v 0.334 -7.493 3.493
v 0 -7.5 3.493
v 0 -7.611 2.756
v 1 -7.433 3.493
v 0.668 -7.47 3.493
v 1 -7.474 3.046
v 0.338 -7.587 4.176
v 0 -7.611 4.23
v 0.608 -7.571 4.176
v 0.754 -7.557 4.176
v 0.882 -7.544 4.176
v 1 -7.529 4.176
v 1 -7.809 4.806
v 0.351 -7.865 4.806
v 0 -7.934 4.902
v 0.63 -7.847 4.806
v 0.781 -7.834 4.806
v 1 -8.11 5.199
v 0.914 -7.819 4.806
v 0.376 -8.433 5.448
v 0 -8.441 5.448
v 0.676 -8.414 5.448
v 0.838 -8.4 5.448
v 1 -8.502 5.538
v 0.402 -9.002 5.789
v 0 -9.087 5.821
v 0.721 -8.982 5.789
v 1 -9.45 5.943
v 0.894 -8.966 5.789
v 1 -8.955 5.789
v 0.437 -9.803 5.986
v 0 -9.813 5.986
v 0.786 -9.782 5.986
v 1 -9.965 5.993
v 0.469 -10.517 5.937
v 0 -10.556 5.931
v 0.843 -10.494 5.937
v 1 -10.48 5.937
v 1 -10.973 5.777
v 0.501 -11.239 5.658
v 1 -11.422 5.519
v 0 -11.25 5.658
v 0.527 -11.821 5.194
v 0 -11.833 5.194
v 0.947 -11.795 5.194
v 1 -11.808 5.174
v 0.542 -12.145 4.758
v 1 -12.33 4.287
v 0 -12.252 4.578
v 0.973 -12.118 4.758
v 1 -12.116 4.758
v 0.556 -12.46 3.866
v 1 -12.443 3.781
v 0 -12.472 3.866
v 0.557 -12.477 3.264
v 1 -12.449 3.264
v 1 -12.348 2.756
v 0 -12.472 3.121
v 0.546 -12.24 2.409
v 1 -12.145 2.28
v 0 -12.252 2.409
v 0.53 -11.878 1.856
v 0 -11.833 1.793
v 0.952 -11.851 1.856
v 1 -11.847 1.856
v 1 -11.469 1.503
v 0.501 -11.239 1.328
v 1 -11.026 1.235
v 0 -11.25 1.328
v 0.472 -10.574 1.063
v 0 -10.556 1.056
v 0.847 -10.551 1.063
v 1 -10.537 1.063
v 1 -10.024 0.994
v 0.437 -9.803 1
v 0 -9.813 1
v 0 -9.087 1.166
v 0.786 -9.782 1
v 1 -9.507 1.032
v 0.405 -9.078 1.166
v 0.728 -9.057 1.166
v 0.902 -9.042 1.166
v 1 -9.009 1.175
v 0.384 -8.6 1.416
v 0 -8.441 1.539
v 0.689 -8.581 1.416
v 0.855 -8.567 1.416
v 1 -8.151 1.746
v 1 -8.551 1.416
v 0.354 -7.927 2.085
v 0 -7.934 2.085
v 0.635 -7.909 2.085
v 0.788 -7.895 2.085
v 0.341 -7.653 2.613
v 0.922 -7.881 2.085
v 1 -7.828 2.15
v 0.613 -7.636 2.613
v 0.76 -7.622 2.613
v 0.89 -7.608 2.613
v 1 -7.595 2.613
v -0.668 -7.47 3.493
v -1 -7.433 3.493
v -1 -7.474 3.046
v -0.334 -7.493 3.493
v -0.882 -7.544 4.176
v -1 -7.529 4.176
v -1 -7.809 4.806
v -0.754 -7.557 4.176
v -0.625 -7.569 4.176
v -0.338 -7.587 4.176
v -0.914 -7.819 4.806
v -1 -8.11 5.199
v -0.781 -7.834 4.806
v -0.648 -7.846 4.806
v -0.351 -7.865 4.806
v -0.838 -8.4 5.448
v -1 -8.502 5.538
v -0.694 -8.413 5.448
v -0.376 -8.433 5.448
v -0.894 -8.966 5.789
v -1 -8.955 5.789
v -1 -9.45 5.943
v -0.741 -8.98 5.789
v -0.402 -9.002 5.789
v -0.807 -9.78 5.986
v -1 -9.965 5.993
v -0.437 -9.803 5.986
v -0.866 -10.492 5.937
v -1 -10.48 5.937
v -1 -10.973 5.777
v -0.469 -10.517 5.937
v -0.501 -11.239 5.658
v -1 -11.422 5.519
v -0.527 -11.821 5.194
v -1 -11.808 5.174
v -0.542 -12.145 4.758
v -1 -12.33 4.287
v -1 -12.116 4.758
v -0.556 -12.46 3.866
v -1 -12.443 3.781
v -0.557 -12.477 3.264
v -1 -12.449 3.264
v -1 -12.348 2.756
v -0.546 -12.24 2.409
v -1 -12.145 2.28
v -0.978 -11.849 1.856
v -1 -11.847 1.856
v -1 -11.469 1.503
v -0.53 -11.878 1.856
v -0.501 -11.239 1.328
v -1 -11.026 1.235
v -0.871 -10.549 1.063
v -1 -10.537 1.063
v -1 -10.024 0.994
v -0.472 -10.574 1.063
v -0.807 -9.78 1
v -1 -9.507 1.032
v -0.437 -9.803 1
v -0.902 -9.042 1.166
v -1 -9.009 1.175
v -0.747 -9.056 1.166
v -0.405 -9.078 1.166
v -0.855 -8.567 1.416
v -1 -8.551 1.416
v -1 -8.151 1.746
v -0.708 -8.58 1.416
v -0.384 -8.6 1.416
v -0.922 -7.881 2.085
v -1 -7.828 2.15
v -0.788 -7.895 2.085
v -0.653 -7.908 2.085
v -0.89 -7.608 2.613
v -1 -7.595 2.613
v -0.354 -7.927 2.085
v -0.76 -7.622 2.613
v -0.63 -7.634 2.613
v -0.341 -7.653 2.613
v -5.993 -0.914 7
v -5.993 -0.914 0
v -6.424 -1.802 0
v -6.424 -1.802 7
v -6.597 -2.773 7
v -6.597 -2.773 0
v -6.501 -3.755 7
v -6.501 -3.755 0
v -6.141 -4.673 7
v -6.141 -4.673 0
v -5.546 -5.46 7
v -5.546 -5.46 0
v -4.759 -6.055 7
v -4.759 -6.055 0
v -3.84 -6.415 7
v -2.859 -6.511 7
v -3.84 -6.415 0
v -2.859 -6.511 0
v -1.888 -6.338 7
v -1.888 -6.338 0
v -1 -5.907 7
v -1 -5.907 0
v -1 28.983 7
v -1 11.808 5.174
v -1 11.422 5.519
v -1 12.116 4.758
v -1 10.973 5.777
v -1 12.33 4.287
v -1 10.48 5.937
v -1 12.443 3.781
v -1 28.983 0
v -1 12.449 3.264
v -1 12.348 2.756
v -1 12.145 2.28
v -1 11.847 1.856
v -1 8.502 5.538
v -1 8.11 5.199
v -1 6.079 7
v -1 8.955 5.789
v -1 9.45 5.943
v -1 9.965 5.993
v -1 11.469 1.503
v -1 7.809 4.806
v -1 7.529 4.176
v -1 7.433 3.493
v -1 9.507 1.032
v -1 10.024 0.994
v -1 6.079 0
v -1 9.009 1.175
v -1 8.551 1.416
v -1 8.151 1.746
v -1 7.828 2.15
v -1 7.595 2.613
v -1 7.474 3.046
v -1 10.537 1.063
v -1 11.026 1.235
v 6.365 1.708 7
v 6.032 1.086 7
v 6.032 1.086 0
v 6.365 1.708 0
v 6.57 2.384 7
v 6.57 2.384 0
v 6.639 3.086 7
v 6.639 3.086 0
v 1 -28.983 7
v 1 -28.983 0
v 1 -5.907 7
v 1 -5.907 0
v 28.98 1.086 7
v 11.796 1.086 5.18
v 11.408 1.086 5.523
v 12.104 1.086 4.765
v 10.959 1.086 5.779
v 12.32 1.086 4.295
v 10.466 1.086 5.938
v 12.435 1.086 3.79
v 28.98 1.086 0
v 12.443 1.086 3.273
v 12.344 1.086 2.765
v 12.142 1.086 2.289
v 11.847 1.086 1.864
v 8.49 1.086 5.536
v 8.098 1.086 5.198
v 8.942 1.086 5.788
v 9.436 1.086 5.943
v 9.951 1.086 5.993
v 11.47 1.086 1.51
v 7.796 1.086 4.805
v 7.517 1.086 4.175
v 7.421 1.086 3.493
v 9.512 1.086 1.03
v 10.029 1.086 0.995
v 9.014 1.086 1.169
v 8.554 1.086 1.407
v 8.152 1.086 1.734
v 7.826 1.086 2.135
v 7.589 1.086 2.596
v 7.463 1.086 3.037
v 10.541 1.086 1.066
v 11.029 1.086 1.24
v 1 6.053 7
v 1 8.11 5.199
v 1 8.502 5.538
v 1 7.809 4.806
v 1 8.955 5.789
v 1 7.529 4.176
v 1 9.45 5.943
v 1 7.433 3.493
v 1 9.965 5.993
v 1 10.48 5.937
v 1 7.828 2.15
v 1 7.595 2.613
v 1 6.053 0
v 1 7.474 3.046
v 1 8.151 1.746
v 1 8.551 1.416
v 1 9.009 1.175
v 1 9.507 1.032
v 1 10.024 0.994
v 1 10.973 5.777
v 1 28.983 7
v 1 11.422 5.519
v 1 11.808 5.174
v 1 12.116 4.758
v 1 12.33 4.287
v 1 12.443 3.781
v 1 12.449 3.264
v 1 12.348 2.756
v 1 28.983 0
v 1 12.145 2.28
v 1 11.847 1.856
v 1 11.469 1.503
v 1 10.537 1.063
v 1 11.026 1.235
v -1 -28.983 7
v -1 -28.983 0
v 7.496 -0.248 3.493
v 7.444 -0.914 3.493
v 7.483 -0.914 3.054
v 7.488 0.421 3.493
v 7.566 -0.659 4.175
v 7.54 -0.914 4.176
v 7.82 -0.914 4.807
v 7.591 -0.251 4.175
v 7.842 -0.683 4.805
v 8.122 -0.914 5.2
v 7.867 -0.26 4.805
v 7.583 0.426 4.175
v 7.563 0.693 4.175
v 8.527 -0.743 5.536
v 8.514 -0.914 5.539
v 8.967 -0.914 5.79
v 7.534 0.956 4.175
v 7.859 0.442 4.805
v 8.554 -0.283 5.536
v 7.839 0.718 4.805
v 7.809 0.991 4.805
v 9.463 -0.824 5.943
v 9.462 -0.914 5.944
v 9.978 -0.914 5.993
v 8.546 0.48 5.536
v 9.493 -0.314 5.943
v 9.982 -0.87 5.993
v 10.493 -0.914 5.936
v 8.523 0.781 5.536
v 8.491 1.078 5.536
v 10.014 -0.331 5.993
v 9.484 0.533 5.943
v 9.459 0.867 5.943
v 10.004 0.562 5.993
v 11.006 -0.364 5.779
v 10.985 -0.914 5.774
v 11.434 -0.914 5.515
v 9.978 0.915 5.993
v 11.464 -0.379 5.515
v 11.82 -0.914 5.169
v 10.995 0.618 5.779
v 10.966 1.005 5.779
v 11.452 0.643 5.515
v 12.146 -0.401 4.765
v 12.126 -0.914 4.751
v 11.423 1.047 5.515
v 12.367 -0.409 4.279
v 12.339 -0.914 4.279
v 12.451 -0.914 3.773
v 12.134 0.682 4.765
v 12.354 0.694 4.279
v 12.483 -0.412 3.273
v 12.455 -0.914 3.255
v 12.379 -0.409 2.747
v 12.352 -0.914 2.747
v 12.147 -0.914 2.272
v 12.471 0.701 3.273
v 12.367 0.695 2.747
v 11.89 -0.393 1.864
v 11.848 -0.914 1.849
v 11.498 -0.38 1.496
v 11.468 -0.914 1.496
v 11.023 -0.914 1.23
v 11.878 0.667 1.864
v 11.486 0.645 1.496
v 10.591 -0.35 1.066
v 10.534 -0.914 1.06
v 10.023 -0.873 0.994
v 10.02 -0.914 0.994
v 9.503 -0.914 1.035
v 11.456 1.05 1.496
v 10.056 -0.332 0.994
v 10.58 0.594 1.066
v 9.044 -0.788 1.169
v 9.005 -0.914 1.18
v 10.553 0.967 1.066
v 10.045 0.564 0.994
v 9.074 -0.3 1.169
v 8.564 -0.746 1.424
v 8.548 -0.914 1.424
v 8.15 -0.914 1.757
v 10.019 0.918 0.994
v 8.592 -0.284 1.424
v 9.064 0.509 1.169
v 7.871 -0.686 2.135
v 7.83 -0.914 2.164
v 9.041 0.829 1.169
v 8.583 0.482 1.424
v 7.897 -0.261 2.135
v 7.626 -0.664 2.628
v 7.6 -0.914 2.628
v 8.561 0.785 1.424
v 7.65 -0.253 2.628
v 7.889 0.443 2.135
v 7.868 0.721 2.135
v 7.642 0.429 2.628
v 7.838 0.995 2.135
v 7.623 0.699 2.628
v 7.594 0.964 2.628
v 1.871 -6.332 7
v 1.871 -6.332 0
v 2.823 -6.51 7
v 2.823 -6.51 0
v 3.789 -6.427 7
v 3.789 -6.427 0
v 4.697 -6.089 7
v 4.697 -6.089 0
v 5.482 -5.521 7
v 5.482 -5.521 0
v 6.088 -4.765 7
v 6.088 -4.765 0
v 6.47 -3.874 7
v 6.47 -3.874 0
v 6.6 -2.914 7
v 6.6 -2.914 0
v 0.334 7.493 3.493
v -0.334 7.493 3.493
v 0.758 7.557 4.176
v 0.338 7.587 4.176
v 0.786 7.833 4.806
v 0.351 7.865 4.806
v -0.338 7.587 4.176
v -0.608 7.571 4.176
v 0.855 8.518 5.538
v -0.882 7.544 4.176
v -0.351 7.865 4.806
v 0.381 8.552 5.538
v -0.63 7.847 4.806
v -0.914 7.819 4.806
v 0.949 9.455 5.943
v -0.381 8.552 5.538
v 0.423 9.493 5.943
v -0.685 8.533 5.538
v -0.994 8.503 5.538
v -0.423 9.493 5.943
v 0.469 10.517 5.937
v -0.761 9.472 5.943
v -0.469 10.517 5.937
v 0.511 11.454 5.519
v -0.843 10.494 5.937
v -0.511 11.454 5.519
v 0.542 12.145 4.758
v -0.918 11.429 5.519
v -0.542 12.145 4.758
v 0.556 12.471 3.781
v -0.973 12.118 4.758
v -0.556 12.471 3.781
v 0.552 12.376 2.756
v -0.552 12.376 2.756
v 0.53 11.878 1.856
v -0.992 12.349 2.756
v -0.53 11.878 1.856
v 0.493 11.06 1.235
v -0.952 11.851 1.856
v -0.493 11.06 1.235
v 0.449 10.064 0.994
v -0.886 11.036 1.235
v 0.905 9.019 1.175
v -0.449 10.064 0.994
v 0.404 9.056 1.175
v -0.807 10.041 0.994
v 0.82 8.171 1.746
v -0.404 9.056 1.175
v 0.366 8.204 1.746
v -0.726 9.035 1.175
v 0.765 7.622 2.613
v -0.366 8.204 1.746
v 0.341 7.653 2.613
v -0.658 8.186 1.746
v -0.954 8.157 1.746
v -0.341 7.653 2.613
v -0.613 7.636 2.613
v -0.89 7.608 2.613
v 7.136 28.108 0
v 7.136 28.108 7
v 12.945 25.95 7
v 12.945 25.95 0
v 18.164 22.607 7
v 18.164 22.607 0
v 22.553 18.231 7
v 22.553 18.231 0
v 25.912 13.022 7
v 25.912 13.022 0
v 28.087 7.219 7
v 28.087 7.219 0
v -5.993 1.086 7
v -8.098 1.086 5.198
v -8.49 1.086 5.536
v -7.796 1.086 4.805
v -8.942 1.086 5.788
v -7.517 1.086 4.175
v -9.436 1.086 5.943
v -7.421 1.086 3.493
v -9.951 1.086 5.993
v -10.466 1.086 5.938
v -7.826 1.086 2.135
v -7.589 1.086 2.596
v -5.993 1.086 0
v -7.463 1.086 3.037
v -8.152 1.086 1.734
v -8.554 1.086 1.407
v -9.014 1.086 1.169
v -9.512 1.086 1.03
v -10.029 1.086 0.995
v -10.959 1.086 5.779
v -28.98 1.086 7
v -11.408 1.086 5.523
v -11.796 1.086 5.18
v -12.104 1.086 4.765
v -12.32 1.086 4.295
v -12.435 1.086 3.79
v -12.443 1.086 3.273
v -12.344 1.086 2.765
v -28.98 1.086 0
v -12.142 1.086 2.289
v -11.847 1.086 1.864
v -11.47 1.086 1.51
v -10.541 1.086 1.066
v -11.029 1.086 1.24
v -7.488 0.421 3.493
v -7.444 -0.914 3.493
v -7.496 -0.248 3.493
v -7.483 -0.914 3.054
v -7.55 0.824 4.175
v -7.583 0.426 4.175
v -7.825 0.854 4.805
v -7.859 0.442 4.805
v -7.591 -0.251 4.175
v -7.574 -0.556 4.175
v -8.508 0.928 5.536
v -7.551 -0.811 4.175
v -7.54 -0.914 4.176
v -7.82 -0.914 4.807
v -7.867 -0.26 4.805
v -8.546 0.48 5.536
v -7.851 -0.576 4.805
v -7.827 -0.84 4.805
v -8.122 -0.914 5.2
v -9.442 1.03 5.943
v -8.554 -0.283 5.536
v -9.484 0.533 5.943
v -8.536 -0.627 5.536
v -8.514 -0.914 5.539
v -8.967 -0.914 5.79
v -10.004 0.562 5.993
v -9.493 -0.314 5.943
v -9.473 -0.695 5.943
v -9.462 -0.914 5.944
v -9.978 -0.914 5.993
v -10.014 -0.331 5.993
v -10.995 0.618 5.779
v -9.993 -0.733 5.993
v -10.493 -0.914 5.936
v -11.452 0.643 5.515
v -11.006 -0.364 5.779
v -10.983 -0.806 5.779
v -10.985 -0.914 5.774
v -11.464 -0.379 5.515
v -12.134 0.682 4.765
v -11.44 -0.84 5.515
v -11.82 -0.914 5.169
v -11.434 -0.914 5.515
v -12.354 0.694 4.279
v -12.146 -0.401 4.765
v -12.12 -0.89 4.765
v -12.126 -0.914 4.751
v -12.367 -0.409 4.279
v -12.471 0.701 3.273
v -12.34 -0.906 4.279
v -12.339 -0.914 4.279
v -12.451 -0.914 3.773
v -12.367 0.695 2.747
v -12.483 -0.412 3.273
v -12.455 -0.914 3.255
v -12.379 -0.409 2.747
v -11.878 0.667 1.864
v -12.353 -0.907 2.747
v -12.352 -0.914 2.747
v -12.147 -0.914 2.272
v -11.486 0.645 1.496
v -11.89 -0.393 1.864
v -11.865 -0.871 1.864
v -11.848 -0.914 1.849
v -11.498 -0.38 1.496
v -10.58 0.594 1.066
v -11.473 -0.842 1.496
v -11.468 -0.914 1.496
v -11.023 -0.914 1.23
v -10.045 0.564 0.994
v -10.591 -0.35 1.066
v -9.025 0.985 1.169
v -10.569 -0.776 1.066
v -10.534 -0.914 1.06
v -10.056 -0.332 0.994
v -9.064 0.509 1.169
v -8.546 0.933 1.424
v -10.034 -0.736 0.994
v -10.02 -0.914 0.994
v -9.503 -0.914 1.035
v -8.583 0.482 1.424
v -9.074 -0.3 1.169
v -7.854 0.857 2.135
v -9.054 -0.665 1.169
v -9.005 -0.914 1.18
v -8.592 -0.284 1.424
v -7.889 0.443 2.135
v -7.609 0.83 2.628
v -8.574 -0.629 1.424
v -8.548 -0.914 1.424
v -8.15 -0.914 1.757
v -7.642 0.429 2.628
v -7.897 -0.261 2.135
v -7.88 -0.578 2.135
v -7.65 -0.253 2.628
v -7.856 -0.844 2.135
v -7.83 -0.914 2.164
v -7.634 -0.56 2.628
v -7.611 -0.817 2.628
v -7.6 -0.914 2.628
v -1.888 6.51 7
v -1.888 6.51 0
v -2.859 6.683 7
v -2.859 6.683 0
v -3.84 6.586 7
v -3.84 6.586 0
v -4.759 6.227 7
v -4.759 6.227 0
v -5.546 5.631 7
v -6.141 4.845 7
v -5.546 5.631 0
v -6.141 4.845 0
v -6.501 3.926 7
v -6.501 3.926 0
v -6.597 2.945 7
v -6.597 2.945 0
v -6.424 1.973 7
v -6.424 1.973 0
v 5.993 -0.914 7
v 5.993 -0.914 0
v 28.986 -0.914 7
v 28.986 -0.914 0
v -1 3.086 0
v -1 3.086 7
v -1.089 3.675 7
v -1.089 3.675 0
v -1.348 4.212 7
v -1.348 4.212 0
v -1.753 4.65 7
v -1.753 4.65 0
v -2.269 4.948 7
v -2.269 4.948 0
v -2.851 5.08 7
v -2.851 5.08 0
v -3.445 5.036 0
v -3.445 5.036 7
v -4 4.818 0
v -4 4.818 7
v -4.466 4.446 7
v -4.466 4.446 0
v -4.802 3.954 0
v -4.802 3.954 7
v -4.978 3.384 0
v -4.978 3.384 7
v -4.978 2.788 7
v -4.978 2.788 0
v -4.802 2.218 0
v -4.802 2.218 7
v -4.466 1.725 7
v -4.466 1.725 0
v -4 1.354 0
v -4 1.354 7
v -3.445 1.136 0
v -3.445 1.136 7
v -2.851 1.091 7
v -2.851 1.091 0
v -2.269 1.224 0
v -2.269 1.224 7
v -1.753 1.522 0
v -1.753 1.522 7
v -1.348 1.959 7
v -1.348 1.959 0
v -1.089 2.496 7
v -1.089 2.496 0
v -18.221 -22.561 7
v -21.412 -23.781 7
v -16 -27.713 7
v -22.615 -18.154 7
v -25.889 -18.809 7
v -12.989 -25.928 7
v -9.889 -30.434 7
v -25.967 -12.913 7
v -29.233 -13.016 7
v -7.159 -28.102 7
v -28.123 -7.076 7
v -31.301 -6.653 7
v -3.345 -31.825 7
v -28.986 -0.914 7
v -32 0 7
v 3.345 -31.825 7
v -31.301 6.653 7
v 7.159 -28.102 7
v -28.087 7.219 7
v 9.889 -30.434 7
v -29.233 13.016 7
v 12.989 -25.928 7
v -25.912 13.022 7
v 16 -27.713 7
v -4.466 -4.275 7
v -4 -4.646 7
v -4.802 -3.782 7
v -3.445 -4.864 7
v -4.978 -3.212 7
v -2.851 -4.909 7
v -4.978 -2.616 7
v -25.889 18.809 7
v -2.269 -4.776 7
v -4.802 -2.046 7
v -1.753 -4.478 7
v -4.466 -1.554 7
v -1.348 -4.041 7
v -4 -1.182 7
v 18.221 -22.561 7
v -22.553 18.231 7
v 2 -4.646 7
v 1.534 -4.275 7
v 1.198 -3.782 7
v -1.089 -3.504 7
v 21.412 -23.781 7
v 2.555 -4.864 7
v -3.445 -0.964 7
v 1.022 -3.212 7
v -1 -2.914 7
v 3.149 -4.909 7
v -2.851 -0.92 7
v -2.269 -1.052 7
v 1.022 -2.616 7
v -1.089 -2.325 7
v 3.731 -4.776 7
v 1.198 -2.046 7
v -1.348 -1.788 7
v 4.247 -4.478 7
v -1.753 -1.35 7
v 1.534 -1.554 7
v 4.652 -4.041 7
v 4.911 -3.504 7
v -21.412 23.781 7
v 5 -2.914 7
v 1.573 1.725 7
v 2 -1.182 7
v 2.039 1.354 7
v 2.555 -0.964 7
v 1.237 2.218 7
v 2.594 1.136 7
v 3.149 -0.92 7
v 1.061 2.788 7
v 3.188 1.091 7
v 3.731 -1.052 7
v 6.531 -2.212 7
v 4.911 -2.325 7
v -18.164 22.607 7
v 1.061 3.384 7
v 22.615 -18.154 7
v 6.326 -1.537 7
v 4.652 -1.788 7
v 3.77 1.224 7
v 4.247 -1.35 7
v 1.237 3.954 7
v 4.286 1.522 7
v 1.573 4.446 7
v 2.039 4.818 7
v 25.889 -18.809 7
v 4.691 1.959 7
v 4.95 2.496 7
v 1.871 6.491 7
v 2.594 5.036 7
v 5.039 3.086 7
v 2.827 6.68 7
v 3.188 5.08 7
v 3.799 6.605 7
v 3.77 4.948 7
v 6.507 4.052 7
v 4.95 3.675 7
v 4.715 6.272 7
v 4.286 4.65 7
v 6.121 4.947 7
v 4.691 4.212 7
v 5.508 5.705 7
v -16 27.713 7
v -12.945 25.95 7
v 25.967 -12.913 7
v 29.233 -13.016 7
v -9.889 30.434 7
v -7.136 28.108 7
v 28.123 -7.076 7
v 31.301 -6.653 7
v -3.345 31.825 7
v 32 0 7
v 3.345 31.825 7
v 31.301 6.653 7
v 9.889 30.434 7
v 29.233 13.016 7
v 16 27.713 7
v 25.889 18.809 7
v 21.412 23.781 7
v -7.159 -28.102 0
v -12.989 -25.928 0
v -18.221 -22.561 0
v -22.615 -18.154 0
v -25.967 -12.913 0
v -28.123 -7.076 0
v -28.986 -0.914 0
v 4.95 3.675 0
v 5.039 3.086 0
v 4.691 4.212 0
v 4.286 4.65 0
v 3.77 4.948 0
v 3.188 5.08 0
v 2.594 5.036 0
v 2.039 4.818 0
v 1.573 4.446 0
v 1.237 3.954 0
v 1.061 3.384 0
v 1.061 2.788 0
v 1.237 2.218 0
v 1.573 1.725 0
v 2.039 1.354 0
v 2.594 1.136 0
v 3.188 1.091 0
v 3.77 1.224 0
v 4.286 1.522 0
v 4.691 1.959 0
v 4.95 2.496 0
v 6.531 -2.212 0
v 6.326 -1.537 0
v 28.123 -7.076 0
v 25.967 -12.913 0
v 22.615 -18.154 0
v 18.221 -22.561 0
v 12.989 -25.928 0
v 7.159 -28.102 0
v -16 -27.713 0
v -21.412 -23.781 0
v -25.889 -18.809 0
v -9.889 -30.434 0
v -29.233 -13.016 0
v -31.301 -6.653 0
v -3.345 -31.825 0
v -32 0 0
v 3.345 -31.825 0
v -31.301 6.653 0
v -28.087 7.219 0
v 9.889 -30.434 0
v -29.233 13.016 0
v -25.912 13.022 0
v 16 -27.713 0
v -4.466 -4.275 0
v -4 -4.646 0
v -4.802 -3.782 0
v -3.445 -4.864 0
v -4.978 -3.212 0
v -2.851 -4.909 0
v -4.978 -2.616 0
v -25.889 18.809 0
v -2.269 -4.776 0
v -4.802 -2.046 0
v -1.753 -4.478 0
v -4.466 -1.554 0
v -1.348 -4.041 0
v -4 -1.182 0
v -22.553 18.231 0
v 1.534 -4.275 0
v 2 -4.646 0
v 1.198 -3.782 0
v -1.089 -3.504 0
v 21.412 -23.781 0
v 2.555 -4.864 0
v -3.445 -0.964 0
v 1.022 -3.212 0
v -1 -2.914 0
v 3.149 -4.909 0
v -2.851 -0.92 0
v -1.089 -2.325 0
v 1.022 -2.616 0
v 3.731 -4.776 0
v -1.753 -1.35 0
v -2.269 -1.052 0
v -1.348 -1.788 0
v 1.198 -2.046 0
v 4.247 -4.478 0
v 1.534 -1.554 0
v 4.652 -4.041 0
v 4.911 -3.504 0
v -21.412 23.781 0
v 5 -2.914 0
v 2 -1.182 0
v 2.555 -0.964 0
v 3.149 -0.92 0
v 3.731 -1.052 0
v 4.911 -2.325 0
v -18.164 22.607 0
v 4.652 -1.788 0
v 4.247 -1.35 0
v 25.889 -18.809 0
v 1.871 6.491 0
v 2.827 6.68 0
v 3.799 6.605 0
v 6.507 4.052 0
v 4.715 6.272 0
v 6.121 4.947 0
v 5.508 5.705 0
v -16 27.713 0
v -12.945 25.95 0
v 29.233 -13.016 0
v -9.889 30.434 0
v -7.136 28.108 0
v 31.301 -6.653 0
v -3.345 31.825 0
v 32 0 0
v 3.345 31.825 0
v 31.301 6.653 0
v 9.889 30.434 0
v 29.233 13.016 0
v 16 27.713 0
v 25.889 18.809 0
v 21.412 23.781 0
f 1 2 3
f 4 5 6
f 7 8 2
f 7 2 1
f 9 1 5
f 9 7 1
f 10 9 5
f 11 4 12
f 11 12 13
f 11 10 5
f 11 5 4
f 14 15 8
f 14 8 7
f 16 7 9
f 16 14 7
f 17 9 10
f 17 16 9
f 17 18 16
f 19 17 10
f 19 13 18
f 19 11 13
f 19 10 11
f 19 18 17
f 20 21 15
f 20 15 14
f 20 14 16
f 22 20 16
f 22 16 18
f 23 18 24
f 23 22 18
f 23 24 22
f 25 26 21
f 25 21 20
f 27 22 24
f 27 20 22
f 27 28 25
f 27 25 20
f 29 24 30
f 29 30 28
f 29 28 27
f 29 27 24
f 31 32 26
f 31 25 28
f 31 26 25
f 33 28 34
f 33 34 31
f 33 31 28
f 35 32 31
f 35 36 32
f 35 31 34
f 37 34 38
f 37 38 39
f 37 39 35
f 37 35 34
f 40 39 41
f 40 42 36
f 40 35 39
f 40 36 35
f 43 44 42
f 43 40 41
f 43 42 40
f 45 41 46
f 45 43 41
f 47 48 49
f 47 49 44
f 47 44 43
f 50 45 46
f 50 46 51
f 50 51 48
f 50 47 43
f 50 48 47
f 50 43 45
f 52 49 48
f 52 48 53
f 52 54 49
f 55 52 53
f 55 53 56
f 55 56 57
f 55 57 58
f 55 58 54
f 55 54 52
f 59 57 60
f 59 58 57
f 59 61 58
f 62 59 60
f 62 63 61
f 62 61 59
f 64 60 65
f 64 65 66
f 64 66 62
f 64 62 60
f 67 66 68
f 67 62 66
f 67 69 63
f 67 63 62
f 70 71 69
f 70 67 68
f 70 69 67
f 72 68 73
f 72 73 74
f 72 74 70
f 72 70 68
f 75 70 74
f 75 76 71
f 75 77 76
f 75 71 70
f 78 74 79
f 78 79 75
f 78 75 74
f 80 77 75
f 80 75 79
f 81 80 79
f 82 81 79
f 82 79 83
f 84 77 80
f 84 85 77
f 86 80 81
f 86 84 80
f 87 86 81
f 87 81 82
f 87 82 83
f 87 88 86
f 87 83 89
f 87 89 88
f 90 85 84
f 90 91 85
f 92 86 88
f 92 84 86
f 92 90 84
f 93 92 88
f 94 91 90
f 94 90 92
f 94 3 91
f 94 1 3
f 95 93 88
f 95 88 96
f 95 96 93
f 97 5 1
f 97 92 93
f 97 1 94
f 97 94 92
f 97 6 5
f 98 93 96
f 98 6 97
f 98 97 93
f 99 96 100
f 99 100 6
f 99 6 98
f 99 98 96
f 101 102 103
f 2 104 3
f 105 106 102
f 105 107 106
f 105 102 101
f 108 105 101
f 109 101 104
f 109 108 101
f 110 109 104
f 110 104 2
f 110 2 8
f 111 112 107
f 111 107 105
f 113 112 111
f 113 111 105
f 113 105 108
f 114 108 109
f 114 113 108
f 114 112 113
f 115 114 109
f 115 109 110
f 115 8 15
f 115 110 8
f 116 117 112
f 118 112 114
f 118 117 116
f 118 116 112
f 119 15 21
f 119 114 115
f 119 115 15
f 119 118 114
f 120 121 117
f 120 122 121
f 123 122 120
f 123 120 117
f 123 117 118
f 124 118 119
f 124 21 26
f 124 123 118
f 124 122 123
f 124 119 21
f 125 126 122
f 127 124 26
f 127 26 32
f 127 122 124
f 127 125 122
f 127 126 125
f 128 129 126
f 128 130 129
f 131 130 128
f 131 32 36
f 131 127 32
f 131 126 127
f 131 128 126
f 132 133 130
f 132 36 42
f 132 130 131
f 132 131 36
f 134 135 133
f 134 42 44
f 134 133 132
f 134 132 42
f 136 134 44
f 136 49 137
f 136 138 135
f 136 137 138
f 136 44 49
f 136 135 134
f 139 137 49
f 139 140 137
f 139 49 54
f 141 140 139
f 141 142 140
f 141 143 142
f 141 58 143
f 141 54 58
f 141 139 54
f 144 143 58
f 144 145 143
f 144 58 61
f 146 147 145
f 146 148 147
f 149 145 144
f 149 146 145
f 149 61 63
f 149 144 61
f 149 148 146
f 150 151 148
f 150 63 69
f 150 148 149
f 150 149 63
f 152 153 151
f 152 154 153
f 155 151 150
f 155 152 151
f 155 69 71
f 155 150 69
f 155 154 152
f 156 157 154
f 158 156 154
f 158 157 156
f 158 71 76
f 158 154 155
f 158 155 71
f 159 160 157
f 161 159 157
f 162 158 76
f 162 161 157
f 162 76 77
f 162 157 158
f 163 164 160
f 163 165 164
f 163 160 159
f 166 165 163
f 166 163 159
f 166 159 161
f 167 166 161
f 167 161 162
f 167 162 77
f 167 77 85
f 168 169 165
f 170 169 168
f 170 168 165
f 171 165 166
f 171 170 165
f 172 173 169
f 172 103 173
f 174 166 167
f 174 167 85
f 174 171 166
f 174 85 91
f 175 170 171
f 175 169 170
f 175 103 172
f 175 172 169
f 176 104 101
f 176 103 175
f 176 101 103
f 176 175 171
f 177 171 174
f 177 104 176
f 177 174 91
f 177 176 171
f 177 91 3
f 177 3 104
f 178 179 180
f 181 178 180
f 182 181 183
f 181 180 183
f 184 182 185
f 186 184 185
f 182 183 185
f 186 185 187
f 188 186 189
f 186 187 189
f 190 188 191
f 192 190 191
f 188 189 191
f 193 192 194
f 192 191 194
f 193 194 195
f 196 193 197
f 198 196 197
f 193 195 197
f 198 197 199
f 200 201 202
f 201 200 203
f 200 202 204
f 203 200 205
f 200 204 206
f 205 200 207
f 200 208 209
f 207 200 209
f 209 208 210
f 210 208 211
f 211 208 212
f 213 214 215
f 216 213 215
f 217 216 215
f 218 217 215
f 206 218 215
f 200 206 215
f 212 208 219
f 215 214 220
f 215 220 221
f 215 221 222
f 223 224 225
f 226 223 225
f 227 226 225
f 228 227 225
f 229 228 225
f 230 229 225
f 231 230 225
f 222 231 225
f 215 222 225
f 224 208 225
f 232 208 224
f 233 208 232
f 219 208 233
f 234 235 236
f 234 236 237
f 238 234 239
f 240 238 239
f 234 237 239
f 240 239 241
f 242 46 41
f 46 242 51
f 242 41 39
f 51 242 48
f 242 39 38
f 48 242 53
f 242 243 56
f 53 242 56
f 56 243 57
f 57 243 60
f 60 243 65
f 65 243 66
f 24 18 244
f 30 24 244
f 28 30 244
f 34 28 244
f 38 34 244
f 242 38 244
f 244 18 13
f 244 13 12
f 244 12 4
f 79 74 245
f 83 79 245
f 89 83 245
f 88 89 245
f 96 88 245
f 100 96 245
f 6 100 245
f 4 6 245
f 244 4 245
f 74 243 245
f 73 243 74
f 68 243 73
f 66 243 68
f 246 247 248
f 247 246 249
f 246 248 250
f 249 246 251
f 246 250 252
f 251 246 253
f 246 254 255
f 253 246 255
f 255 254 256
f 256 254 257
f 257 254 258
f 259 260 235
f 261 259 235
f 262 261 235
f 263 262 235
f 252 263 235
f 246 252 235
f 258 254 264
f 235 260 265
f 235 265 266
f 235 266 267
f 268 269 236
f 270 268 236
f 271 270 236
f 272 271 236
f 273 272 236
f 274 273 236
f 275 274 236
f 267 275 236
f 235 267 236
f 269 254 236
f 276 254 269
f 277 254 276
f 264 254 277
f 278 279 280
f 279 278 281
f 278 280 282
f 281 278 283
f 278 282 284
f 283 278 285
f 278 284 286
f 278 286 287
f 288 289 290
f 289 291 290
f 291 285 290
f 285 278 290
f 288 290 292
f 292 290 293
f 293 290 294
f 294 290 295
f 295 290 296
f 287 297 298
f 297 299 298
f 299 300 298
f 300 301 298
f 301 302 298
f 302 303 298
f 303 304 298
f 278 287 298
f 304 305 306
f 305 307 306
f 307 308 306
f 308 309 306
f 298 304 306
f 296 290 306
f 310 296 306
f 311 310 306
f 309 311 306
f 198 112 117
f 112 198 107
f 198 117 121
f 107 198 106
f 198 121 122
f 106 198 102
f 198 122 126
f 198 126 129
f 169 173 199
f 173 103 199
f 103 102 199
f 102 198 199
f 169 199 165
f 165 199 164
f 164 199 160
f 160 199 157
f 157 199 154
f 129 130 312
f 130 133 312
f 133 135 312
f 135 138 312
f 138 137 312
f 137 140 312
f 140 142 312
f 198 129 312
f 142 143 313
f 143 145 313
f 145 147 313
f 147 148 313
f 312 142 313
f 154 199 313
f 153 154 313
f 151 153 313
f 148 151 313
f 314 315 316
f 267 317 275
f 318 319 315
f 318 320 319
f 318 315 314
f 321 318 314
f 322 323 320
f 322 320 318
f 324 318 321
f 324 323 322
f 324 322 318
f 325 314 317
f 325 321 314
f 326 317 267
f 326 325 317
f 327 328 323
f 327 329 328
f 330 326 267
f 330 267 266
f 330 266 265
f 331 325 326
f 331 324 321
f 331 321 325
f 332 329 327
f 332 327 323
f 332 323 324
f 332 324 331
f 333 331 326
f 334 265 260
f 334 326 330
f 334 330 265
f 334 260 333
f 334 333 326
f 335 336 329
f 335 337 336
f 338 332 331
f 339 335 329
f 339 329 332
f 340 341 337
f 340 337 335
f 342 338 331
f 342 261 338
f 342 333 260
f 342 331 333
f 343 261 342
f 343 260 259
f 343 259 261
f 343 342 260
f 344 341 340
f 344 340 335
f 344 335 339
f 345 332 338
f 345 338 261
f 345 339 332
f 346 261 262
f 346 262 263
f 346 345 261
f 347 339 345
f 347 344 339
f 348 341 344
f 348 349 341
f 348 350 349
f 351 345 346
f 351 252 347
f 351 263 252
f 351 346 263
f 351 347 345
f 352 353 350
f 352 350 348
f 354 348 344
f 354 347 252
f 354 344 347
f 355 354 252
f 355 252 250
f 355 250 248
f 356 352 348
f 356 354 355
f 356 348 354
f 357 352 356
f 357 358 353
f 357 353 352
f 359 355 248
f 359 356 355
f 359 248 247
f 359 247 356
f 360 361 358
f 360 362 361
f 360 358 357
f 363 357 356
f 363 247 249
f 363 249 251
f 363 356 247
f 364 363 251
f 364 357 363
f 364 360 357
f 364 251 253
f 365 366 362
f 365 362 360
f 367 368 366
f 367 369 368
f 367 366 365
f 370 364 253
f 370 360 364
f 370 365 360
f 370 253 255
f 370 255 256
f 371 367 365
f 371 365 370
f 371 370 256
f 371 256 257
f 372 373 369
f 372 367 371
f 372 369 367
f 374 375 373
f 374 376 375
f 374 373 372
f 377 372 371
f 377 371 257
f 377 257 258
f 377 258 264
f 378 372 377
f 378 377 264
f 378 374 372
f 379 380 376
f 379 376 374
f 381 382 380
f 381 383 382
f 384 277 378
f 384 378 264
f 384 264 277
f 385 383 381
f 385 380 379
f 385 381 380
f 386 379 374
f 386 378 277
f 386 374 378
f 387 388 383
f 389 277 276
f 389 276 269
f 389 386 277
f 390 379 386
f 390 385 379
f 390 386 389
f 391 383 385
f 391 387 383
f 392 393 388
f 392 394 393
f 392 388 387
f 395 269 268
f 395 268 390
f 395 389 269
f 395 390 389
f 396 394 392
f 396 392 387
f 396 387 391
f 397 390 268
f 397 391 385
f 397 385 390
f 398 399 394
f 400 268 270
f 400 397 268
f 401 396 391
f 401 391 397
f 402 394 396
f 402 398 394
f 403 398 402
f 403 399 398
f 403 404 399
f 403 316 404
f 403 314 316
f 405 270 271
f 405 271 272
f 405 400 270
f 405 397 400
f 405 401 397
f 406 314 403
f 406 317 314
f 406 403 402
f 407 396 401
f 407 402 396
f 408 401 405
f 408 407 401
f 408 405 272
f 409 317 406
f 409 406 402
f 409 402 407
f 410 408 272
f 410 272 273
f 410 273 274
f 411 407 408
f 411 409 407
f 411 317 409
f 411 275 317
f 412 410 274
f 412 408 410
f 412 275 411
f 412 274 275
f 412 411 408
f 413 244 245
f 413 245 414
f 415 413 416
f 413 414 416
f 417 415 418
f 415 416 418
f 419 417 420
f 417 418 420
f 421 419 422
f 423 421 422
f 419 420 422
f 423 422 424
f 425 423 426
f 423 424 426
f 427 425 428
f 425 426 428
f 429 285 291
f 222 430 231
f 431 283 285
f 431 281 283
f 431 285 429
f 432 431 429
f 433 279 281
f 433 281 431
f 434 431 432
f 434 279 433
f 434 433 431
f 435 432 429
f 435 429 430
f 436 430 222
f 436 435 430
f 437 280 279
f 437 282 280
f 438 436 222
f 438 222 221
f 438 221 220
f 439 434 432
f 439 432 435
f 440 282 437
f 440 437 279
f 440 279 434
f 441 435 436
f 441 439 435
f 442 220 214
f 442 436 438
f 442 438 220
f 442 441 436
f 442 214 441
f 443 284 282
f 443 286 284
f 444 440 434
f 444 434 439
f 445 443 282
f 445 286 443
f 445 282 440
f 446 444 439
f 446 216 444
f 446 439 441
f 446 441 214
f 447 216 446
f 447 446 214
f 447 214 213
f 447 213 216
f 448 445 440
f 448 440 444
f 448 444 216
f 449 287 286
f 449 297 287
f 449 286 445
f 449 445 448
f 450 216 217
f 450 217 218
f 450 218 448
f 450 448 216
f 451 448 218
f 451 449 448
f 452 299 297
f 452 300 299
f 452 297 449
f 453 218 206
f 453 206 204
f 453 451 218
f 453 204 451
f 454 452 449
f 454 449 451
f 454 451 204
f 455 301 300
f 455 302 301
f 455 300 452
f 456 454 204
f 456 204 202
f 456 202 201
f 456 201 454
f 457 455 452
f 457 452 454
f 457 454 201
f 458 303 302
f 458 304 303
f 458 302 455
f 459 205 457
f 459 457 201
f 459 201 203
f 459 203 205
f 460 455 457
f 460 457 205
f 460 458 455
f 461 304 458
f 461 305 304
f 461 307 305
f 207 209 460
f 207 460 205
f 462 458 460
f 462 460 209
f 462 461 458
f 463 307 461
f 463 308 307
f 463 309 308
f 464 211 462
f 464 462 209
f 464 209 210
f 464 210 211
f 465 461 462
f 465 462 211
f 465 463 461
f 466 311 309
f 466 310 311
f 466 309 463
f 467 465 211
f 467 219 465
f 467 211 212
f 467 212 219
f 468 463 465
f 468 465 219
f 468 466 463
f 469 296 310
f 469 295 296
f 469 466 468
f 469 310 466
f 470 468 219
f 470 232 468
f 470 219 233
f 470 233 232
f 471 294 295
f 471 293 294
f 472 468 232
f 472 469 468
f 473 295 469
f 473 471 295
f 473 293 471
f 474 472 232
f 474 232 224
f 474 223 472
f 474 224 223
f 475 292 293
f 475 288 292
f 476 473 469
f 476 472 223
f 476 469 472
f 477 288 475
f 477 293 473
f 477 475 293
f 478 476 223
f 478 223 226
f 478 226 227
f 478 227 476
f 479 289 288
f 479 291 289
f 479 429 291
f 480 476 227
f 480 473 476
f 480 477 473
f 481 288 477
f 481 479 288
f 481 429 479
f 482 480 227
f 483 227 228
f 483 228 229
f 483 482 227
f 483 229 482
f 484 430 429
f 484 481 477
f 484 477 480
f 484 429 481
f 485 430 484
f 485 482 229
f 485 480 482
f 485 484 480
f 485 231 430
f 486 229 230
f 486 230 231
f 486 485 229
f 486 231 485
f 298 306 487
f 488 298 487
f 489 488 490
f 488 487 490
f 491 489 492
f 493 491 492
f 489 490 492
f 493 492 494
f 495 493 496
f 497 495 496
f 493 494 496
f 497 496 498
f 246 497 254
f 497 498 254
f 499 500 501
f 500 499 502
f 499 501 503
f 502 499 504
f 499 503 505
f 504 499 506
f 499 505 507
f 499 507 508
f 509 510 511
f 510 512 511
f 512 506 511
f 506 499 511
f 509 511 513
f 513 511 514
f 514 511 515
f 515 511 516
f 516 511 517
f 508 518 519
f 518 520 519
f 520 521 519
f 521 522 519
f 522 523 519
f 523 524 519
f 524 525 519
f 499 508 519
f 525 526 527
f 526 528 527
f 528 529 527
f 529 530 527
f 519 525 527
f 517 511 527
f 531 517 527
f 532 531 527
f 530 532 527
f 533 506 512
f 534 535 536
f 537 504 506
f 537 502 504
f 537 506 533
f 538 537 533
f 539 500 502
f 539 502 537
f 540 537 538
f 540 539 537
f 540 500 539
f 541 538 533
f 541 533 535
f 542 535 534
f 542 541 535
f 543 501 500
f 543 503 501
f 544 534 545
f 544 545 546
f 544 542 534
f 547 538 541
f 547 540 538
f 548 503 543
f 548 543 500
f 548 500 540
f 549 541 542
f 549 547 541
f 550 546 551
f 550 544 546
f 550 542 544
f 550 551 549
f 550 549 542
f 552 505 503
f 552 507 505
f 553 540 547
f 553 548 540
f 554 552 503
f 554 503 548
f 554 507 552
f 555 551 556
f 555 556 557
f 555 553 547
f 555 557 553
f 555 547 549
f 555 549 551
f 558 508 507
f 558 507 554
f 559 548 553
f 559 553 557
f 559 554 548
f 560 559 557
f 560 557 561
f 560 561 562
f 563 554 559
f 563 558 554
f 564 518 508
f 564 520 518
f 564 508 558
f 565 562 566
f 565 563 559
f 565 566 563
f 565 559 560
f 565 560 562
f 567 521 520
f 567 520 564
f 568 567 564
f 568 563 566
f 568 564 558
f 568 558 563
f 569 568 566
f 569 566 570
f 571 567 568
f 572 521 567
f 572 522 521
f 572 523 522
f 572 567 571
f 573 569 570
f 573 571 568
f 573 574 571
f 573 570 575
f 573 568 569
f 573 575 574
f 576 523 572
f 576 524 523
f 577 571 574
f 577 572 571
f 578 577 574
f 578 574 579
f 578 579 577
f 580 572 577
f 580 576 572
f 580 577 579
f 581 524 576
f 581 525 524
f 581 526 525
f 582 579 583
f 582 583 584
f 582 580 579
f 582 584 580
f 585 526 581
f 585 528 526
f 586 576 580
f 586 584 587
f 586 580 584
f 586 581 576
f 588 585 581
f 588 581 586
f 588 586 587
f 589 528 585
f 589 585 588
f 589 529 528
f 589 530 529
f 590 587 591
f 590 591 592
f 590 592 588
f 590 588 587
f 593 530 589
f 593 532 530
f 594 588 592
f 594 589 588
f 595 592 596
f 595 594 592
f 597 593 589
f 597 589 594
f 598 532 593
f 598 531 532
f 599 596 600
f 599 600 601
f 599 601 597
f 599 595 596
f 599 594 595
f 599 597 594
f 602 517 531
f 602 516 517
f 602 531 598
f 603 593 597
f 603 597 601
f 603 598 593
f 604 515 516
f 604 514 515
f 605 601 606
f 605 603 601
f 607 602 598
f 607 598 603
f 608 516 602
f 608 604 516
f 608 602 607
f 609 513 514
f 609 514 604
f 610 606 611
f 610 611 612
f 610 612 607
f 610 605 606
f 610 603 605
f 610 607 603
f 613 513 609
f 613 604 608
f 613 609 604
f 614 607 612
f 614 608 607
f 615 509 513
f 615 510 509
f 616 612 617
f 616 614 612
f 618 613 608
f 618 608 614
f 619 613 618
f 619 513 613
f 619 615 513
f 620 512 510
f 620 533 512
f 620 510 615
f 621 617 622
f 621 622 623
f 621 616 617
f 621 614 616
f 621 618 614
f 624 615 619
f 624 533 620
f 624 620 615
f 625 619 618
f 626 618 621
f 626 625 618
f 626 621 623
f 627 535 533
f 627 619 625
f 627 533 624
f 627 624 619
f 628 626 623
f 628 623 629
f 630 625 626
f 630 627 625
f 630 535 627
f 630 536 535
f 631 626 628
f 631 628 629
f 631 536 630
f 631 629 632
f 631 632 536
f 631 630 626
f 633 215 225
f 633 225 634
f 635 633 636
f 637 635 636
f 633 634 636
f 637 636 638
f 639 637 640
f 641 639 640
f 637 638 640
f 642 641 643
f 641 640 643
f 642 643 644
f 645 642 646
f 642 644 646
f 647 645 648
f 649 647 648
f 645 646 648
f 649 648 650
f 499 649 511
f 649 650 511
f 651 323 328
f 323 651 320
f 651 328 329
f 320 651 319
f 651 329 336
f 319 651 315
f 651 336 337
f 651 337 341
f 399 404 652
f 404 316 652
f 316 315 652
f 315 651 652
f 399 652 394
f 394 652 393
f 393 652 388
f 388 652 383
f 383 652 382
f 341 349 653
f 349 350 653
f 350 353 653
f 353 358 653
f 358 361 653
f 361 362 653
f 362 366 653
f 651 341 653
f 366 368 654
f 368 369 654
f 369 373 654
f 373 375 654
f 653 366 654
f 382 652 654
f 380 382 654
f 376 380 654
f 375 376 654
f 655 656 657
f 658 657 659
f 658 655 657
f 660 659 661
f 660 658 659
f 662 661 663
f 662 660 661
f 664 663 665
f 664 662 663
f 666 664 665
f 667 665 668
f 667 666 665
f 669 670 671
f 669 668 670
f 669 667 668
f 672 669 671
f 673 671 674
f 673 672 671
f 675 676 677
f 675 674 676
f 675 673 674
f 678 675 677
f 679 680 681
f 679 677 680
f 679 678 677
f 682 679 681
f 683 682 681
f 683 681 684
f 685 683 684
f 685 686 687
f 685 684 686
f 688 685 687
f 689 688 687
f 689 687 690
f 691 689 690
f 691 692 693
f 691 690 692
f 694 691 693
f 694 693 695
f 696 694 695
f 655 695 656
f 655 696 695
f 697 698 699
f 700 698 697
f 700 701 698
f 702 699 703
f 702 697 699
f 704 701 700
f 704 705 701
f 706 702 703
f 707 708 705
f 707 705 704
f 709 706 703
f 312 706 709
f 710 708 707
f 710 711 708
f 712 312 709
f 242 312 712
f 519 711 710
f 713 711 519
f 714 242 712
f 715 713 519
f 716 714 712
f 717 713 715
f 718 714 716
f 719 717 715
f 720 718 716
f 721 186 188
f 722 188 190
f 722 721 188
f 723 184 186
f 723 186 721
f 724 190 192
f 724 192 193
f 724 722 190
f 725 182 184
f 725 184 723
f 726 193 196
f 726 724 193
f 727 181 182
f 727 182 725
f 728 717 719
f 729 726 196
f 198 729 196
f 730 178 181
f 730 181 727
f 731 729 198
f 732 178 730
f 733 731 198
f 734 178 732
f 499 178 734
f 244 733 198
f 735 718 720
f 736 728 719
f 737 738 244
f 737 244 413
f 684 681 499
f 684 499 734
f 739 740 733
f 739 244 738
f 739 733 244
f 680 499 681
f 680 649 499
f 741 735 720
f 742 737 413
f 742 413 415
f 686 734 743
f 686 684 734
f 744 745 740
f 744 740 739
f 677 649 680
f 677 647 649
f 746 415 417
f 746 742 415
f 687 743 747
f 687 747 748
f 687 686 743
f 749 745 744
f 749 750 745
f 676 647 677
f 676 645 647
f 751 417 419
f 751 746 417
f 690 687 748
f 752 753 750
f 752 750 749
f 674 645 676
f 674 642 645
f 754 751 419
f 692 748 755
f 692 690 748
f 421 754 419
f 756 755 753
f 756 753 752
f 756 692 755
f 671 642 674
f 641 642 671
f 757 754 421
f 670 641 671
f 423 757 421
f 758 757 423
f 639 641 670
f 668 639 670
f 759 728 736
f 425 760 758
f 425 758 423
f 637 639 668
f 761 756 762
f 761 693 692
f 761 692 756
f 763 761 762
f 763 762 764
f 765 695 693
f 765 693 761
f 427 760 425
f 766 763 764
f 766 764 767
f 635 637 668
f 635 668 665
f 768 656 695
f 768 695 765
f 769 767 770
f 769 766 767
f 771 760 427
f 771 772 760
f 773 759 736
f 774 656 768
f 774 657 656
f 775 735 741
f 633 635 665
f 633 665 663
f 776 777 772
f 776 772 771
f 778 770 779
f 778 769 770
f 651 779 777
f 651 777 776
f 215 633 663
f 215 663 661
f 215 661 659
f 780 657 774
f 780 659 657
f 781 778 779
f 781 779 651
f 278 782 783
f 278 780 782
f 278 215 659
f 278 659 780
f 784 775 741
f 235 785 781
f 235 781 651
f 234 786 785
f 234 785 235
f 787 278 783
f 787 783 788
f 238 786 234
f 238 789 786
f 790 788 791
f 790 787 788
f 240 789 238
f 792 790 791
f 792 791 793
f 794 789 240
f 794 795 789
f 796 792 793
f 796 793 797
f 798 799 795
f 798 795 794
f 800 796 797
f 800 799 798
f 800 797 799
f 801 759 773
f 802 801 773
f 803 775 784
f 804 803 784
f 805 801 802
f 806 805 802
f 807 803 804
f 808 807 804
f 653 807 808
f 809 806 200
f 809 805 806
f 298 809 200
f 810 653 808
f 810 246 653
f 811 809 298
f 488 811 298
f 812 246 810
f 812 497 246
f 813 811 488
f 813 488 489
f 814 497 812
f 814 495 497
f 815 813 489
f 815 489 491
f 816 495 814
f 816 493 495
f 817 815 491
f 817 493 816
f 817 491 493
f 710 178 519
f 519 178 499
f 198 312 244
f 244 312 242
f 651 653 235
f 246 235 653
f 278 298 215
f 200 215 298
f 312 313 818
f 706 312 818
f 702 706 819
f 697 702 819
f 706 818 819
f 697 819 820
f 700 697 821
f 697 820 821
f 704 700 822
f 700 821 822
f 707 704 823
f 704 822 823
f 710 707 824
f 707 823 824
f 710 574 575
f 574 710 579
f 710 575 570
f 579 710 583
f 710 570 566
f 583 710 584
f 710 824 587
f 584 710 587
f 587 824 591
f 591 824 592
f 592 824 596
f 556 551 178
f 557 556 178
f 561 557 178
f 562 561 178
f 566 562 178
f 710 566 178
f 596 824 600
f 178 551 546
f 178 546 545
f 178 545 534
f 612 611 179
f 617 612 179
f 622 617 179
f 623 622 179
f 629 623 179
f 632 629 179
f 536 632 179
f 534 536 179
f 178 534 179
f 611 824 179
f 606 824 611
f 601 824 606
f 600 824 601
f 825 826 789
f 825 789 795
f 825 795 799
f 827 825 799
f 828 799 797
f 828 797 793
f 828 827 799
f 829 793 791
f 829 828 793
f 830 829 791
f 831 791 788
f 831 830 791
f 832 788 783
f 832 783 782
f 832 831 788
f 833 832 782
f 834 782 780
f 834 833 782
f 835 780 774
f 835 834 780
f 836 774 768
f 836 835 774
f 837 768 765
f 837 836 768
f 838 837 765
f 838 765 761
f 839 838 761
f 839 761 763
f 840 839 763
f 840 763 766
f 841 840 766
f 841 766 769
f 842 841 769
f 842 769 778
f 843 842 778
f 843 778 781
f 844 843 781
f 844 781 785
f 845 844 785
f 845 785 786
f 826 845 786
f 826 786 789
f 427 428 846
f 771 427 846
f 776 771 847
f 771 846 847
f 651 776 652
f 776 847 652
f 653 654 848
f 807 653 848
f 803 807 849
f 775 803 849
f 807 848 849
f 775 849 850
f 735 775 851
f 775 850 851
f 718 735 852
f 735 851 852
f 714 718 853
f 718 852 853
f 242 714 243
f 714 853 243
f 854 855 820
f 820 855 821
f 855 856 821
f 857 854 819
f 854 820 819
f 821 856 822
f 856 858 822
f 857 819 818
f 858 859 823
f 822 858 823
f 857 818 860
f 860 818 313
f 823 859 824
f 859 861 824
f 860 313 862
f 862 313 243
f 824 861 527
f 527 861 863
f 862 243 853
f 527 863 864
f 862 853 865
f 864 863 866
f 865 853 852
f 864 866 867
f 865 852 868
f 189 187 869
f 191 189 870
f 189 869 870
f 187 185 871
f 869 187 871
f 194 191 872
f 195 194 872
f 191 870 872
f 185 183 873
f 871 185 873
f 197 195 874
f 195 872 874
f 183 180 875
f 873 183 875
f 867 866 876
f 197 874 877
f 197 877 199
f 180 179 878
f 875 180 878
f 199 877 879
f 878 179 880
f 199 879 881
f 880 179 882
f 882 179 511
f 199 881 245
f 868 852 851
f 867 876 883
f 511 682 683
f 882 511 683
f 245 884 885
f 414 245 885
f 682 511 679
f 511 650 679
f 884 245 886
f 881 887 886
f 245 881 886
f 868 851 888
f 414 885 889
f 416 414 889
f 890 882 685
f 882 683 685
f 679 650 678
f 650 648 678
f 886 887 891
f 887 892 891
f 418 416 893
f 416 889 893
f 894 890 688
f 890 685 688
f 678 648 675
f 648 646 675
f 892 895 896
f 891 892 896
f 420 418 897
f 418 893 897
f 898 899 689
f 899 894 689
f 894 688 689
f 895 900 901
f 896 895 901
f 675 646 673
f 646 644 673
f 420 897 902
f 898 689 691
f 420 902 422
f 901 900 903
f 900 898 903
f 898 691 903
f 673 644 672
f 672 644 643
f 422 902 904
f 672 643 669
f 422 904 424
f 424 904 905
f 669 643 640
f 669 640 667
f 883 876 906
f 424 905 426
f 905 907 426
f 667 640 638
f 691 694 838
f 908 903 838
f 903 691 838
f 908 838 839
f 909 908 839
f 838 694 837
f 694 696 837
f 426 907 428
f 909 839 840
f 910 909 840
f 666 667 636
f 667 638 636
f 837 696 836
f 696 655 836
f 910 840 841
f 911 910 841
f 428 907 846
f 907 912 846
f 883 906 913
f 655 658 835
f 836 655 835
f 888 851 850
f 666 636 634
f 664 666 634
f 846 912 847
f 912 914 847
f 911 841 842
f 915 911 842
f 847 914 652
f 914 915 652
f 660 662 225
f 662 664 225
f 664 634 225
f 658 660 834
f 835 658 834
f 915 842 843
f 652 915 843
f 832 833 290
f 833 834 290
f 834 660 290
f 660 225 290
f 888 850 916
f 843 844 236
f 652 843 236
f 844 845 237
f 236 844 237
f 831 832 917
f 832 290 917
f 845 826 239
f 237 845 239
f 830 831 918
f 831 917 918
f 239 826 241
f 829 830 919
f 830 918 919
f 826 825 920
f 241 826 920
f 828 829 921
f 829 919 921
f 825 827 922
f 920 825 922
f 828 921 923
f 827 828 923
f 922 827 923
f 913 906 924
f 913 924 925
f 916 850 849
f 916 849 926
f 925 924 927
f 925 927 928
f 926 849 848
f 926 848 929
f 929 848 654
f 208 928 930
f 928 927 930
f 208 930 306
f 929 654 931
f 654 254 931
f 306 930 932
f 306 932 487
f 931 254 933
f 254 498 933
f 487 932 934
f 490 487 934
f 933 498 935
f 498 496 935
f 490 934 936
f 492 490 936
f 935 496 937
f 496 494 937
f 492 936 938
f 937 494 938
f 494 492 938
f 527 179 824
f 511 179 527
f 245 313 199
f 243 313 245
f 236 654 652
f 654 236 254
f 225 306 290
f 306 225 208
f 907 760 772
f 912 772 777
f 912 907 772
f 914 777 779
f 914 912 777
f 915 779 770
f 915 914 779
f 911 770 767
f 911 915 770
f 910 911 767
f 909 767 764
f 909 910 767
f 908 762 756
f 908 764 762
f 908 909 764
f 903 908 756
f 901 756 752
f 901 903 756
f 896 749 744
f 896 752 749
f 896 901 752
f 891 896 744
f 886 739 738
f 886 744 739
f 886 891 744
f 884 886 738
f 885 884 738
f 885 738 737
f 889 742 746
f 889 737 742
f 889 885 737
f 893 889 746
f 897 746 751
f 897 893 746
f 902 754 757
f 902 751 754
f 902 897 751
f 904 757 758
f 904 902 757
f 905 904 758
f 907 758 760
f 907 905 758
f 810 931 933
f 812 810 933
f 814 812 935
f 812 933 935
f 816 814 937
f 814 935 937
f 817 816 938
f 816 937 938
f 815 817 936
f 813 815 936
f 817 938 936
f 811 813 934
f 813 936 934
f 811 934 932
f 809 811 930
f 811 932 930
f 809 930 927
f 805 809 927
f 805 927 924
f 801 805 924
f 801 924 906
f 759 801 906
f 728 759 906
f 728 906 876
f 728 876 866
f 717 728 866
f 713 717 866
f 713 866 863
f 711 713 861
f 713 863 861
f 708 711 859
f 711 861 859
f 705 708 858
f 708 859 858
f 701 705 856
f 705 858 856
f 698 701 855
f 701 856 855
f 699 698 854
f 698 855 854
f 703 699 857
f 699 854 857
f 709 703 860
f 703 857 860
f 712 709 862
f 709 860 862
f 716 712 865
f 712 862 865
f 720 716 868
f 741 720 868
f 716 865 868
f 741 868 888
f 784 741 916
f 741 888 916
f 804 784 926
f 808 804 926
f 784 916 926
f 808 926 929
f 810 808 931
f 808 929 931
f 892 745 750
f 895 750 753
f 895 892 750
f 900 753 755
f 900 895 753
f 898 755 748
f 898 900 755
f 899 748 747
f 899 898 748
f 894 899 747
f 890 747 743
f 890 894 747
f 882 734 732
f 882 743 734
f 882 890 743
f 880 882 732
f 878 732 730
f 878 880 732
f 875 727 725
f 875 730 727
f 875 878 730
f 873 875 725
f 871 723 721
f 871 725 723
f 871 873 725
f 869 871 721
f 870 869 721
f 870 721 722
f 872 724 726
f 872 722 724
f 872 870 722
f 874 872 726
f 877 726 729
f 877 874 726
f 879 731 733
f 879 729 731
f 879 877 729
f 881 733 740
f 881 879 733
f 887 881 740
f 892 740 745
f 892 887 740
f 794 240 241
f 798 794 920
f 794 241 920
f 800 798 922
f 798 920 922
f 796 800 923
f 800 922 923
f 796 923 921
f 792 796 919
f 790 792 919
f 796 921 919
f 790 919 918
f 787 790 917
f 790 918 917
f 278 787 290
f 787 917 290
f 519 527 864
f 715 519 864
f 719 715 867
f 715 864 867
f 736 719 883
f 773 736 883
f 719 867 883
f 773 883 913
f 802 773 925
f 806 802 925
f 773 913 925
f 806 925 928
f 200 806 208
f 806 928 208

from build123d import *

# Parameters (mm, degrees)
F0_R     = 32
F0_W     = 2
F0_H     = 2
F1_DEPTH = 7
F2_R     = 2.5
F4_R     = 2
F5_DEPTH = 7


with BuildPart() as f1:
    # F0 (on Top) → F1 (new body)
    with BuildSketch(Plane.XY):
        Circle(F0_R)
        with BuildLine():
            ThreePointArc((1, 28.9827534924), (20.4757041145, 20.5364442155), (28.9796643011, 1.0858439086))
            Line((28.9796643011, 1.0858439086), (29.9863147924, 1.0858439086))
            Line((29.9863147924, 1.0858439086), (29.9863147924, -0.9141560914))
            Line((29.9863147924, -0.9141560914), (28.9855881196, -0.9141560914))
            ThreePointArc((28.9855881196, -0.9141560914), (20.5364411166, -20.4757072226), (1, -28.9827534924))
            Line((1, -28.9827534924), (1, -29.9833287011))
            Line((1, -29.9833287011), (-1, -29.9833287011))
            Line((-1, -29.9833287011), (-1, -28.9827534924))
            ThreePointArc((-1, -28.9827534924), (-20.5364411166, -20.4757072226), (-28.9855881196, -0.9141560914))
            Line((-28.9855881196, -0.9141560914), (-29.9803426099, -0.9141560914))
            Line((-29.9803426099, -0.9141560914), (-29.9803426099, 1.0858439086))
            Line((-29.9803426099, 1.0858439086), (-28.9796643011, 1.0858439086))
            ThreePointArc((-28.9796643011, 1.0858439086), (-20.4757041145, 20.5364442155), (-1, 28.9827534924))
            Line((-1, 28.9827534924), (-1, 29.9833287011))
            Line((-1, 29.9833287011), (1, 29.9833287011))
            Line((1, 29.9833287011), (1, 28.9827534924))
        make_face(mode=Mode.SUBTRACT)
        with BuildLine():
            ThreePointArc((-1, 28.9827534924), (0, 29), (1, 28.9827534924))
            Line((1, 28.9827534924), (1, 29.9833287011))
            Line((1, 29.9833287011), (-1, 29.9833287011))
            Line((-1, 29.9833287011), (-1, 28.9827534924))
        make_face()
        with BuildLine():
            ThreePointArc((-28.9855881196, -0.9141560914), (-28.9998727937, 0.0858949914), (-28.9796643011, 1.0858439086))
            Line((-28.9796643011, 1.0858439086), (-29.9803426099, 1.0858439086))
            Line((-29.9803426099, 1.0858439086), (-29.9803426099, -0.9141560914))
            Line((-29.9803426099, -0.9141560914), (-28.9855881196, -0.9141560914))
        make_face()
        with BuildLine():
            Line((1, -29.9833287011), (1, -28.9827534924))
            ThreePointArc((1, -28.9827534924), (0, -29), (-1, -28.9827534924))
            Line((-1, -28.9827534924), (-1, -29.9833287011))
            Line((-1, -29.9833287011), (1, -29.9833287011))
        make_face()
        with Locations((0, 0.0858439086)):
            Rectangle(F0_W, F0_H)
        with BuildLine():
            Line((-1, -0.9141560914), (-1, 1.0858439086))
            Line((-1, 1.0858439086), (-28.9796643011, 1.0858439086))
            ThreePointArc((-28.9796643011, 1.0858439086), (-28.9998727937, 0.0858949914), (-28.9855881196, -0.9141560914))
            Line((-28.9855881196, -0.9141560914), (-1, -0.9141560914))
        make_face()
        with BuildLine():
            ThreePointArc((28.9855881196, -0.9141560914), (28.9963968061, -0.4571348438), (29, 0))
            ThreePointArc((29, 0), (28.9949156296, 0.5430171578), (28.9796643011, 1.0858439086))
            Line((28.9796643011, 1.0858439086), (1, 1.0858439086))
            Line((1, 1.0858439086), (1, -0.9141560914))
            Line((1, -0.9141560914), (28.9855881196, -0.9141560914))
        make_face()
        with BuildLine():
            Line((1, 1.0858439086), (1, 28.9827534924))
            ThreePointArc((1, 28.9827534924), (0, 29), (-1, 28.9827534924))
            Line((-1, 28.9827534924), (-1, 1.0858439086))
            Line((-1, 1.0858439086), (1, 1.0858439086))
        make_face()
        with BuildLine():
            ThreePointArc((-1, -28.9827534924), (0, -29), (1, -28.9827534924))
            Line((1, -28.9827534924), (1, -0.9141560914))
            Line((1, -0.9141560914), (-1, -0.9141560914))
            Line((-1, -0.9141560914), (-1, -28.9827534924))
        make_face()
        with BuildLine():
            ThreePointArc((28.9796643011, 1.0858439086), (28.9949156296, 0.5430171578), (29, 0))
            ThreePointArc((29, 0), (28.9963968061, -0.4571348438), (28.9855881196, -0.9141560914))
            Line((28.9855881196, -0.9141560914), (29.9863147924, -0.9141560914))
            Line((29.9863147924, -0.9141560914), (29.9863147924, 1.0858439086))
            Line((29.9863147924, 1.0858439086), (28.9796643011, 1.0858439086))
        make_face()
    extrude(amount=F1_DEPTH)

    # F2 (on Right) → F3 (revolve, cut)
    with BuildSketch(Plane.YZ):
        with Locations((-10, 3.4933774173)):
            Circle(F2_R)
    revolve(axis=Axis((0, 0, 9.8674278706), (0, 0, 1)), mode=Mode.SUBTRACT)

    # F4 (on Top) → F5 (join)
    with BuildSketch(Plane.XY):
        with BuildLine():
            ThreePointArc((5.0092860358, 0.072944447), (6.2053928233, 1.3731565576), (6.6388960149, 3.0858439086))
            ThreePointArc((6.6388960149, 3.0858439086), (4.061145293, 6.5376559564), (0.0194480075, 5.0461841164))
            ThreePointArc((0.0194480075, 5.0461841164), (0.4518120478, 4.1080931867), (0.6, 3.0858439086))
            ThreePointArc((0.6, 3.0858439086), (0.4518120478, 2.0635946305), (0.0194480075, 1.1255037008))
            ThreePointArc((0.0194480075, 1.1255037008), (0.4726534867, 0.5610866358), (1.0296099792, 0.0987433702))
            ThreePointArc((1.0296099792, 0.0987433702), (3.0233371186, 0.685768266), (5.0092860358, 0.072944447))
        make_face()
        with Locations((3.0388960149, 3.0858439086)):
            Circle(F4_R, mode=Mode.SUBTRACT)
        with BuildLine():
            ThreePointArc((6.6, -2.9141560914), (6.1775328266, -1.2220316469), (5.0092860358, 0.072944447))
            ThreePointArc((5.0092860358, 0.072944447), (3.0155588963, -0.5140804488), (1.0296099792, 0.0987433702))
            ThreePointArc((1.0296099792, 0.0987433702), (0.4627203706, -0.360293902), (0, -0.9241812172))
            ThreePointArc((0, -0.9241812172), (0.4467375879, -1.8749256068), (0.6, -2.9141560914))
            ThreePointArc((0.6, -2.9141560914), (0.4467375879, -3.9533865759), (0, -4.9041309656))
            ThreePointArc((0, -4.9041309656), (4.0392304845, -6.3608936793), (6.6, -2.9141560914))
        make_face()
        with Locations((3, -2.9141560914)):
            Circle(F4_R, mode=Mode.SUBTRACT)
        with BuildLine():
            ThreePointArc((-1.0100251258, 0.0858439086), (-3, -0.5141560914), (-4.9899748742, 0.0858439086))
            ThreePointArc((-4.9899748742, 0.0858439086), (-5.5455844123, -5.4597405036), (0, -4.9041309656))
            ThreePointArc((0, -4.9041309656), (-0.6, -2.9141560914), (0, -0.9241812172))
            ThreePointArc((0, -0.9241812172), (-0.4544155877, -0.3685716791), (-1.0100251258, 0.0858439086))
        make_face()
        with Locations((-3, -2.9141560914)):
            Circle(F4_R, mode=Mode.SUBTRACT)
        with BuildLine():
            ThreePointArc((0.0194480075, 1.1255037008), (-0.5611039851, 3.0858439086), (0.0194480075, 5.0461841164))
            ThreePointArc((0.0194480075, 5.0461841164), (-5.5330214127, 5.6439296231), (-4.9899748742, 0.0858439086))
            ThreePointArc((-4.9899748742, 0.0858439086), (-3, 0.6858439086), (-1.0100251258, 0.0858439086))
            ThreePointArc((-1.0100251258, 0.0858439086), (-0.4419142855, 0.5528224959), (0.0194480075, 1.1255037008))
        make_face()
        with Locations((-3, 3.0858439086)):
            Circle(F4_R, mode=Mode.SUBTRACT)
    extrude(amount=F5_DEPTH)


solid = f1.part
